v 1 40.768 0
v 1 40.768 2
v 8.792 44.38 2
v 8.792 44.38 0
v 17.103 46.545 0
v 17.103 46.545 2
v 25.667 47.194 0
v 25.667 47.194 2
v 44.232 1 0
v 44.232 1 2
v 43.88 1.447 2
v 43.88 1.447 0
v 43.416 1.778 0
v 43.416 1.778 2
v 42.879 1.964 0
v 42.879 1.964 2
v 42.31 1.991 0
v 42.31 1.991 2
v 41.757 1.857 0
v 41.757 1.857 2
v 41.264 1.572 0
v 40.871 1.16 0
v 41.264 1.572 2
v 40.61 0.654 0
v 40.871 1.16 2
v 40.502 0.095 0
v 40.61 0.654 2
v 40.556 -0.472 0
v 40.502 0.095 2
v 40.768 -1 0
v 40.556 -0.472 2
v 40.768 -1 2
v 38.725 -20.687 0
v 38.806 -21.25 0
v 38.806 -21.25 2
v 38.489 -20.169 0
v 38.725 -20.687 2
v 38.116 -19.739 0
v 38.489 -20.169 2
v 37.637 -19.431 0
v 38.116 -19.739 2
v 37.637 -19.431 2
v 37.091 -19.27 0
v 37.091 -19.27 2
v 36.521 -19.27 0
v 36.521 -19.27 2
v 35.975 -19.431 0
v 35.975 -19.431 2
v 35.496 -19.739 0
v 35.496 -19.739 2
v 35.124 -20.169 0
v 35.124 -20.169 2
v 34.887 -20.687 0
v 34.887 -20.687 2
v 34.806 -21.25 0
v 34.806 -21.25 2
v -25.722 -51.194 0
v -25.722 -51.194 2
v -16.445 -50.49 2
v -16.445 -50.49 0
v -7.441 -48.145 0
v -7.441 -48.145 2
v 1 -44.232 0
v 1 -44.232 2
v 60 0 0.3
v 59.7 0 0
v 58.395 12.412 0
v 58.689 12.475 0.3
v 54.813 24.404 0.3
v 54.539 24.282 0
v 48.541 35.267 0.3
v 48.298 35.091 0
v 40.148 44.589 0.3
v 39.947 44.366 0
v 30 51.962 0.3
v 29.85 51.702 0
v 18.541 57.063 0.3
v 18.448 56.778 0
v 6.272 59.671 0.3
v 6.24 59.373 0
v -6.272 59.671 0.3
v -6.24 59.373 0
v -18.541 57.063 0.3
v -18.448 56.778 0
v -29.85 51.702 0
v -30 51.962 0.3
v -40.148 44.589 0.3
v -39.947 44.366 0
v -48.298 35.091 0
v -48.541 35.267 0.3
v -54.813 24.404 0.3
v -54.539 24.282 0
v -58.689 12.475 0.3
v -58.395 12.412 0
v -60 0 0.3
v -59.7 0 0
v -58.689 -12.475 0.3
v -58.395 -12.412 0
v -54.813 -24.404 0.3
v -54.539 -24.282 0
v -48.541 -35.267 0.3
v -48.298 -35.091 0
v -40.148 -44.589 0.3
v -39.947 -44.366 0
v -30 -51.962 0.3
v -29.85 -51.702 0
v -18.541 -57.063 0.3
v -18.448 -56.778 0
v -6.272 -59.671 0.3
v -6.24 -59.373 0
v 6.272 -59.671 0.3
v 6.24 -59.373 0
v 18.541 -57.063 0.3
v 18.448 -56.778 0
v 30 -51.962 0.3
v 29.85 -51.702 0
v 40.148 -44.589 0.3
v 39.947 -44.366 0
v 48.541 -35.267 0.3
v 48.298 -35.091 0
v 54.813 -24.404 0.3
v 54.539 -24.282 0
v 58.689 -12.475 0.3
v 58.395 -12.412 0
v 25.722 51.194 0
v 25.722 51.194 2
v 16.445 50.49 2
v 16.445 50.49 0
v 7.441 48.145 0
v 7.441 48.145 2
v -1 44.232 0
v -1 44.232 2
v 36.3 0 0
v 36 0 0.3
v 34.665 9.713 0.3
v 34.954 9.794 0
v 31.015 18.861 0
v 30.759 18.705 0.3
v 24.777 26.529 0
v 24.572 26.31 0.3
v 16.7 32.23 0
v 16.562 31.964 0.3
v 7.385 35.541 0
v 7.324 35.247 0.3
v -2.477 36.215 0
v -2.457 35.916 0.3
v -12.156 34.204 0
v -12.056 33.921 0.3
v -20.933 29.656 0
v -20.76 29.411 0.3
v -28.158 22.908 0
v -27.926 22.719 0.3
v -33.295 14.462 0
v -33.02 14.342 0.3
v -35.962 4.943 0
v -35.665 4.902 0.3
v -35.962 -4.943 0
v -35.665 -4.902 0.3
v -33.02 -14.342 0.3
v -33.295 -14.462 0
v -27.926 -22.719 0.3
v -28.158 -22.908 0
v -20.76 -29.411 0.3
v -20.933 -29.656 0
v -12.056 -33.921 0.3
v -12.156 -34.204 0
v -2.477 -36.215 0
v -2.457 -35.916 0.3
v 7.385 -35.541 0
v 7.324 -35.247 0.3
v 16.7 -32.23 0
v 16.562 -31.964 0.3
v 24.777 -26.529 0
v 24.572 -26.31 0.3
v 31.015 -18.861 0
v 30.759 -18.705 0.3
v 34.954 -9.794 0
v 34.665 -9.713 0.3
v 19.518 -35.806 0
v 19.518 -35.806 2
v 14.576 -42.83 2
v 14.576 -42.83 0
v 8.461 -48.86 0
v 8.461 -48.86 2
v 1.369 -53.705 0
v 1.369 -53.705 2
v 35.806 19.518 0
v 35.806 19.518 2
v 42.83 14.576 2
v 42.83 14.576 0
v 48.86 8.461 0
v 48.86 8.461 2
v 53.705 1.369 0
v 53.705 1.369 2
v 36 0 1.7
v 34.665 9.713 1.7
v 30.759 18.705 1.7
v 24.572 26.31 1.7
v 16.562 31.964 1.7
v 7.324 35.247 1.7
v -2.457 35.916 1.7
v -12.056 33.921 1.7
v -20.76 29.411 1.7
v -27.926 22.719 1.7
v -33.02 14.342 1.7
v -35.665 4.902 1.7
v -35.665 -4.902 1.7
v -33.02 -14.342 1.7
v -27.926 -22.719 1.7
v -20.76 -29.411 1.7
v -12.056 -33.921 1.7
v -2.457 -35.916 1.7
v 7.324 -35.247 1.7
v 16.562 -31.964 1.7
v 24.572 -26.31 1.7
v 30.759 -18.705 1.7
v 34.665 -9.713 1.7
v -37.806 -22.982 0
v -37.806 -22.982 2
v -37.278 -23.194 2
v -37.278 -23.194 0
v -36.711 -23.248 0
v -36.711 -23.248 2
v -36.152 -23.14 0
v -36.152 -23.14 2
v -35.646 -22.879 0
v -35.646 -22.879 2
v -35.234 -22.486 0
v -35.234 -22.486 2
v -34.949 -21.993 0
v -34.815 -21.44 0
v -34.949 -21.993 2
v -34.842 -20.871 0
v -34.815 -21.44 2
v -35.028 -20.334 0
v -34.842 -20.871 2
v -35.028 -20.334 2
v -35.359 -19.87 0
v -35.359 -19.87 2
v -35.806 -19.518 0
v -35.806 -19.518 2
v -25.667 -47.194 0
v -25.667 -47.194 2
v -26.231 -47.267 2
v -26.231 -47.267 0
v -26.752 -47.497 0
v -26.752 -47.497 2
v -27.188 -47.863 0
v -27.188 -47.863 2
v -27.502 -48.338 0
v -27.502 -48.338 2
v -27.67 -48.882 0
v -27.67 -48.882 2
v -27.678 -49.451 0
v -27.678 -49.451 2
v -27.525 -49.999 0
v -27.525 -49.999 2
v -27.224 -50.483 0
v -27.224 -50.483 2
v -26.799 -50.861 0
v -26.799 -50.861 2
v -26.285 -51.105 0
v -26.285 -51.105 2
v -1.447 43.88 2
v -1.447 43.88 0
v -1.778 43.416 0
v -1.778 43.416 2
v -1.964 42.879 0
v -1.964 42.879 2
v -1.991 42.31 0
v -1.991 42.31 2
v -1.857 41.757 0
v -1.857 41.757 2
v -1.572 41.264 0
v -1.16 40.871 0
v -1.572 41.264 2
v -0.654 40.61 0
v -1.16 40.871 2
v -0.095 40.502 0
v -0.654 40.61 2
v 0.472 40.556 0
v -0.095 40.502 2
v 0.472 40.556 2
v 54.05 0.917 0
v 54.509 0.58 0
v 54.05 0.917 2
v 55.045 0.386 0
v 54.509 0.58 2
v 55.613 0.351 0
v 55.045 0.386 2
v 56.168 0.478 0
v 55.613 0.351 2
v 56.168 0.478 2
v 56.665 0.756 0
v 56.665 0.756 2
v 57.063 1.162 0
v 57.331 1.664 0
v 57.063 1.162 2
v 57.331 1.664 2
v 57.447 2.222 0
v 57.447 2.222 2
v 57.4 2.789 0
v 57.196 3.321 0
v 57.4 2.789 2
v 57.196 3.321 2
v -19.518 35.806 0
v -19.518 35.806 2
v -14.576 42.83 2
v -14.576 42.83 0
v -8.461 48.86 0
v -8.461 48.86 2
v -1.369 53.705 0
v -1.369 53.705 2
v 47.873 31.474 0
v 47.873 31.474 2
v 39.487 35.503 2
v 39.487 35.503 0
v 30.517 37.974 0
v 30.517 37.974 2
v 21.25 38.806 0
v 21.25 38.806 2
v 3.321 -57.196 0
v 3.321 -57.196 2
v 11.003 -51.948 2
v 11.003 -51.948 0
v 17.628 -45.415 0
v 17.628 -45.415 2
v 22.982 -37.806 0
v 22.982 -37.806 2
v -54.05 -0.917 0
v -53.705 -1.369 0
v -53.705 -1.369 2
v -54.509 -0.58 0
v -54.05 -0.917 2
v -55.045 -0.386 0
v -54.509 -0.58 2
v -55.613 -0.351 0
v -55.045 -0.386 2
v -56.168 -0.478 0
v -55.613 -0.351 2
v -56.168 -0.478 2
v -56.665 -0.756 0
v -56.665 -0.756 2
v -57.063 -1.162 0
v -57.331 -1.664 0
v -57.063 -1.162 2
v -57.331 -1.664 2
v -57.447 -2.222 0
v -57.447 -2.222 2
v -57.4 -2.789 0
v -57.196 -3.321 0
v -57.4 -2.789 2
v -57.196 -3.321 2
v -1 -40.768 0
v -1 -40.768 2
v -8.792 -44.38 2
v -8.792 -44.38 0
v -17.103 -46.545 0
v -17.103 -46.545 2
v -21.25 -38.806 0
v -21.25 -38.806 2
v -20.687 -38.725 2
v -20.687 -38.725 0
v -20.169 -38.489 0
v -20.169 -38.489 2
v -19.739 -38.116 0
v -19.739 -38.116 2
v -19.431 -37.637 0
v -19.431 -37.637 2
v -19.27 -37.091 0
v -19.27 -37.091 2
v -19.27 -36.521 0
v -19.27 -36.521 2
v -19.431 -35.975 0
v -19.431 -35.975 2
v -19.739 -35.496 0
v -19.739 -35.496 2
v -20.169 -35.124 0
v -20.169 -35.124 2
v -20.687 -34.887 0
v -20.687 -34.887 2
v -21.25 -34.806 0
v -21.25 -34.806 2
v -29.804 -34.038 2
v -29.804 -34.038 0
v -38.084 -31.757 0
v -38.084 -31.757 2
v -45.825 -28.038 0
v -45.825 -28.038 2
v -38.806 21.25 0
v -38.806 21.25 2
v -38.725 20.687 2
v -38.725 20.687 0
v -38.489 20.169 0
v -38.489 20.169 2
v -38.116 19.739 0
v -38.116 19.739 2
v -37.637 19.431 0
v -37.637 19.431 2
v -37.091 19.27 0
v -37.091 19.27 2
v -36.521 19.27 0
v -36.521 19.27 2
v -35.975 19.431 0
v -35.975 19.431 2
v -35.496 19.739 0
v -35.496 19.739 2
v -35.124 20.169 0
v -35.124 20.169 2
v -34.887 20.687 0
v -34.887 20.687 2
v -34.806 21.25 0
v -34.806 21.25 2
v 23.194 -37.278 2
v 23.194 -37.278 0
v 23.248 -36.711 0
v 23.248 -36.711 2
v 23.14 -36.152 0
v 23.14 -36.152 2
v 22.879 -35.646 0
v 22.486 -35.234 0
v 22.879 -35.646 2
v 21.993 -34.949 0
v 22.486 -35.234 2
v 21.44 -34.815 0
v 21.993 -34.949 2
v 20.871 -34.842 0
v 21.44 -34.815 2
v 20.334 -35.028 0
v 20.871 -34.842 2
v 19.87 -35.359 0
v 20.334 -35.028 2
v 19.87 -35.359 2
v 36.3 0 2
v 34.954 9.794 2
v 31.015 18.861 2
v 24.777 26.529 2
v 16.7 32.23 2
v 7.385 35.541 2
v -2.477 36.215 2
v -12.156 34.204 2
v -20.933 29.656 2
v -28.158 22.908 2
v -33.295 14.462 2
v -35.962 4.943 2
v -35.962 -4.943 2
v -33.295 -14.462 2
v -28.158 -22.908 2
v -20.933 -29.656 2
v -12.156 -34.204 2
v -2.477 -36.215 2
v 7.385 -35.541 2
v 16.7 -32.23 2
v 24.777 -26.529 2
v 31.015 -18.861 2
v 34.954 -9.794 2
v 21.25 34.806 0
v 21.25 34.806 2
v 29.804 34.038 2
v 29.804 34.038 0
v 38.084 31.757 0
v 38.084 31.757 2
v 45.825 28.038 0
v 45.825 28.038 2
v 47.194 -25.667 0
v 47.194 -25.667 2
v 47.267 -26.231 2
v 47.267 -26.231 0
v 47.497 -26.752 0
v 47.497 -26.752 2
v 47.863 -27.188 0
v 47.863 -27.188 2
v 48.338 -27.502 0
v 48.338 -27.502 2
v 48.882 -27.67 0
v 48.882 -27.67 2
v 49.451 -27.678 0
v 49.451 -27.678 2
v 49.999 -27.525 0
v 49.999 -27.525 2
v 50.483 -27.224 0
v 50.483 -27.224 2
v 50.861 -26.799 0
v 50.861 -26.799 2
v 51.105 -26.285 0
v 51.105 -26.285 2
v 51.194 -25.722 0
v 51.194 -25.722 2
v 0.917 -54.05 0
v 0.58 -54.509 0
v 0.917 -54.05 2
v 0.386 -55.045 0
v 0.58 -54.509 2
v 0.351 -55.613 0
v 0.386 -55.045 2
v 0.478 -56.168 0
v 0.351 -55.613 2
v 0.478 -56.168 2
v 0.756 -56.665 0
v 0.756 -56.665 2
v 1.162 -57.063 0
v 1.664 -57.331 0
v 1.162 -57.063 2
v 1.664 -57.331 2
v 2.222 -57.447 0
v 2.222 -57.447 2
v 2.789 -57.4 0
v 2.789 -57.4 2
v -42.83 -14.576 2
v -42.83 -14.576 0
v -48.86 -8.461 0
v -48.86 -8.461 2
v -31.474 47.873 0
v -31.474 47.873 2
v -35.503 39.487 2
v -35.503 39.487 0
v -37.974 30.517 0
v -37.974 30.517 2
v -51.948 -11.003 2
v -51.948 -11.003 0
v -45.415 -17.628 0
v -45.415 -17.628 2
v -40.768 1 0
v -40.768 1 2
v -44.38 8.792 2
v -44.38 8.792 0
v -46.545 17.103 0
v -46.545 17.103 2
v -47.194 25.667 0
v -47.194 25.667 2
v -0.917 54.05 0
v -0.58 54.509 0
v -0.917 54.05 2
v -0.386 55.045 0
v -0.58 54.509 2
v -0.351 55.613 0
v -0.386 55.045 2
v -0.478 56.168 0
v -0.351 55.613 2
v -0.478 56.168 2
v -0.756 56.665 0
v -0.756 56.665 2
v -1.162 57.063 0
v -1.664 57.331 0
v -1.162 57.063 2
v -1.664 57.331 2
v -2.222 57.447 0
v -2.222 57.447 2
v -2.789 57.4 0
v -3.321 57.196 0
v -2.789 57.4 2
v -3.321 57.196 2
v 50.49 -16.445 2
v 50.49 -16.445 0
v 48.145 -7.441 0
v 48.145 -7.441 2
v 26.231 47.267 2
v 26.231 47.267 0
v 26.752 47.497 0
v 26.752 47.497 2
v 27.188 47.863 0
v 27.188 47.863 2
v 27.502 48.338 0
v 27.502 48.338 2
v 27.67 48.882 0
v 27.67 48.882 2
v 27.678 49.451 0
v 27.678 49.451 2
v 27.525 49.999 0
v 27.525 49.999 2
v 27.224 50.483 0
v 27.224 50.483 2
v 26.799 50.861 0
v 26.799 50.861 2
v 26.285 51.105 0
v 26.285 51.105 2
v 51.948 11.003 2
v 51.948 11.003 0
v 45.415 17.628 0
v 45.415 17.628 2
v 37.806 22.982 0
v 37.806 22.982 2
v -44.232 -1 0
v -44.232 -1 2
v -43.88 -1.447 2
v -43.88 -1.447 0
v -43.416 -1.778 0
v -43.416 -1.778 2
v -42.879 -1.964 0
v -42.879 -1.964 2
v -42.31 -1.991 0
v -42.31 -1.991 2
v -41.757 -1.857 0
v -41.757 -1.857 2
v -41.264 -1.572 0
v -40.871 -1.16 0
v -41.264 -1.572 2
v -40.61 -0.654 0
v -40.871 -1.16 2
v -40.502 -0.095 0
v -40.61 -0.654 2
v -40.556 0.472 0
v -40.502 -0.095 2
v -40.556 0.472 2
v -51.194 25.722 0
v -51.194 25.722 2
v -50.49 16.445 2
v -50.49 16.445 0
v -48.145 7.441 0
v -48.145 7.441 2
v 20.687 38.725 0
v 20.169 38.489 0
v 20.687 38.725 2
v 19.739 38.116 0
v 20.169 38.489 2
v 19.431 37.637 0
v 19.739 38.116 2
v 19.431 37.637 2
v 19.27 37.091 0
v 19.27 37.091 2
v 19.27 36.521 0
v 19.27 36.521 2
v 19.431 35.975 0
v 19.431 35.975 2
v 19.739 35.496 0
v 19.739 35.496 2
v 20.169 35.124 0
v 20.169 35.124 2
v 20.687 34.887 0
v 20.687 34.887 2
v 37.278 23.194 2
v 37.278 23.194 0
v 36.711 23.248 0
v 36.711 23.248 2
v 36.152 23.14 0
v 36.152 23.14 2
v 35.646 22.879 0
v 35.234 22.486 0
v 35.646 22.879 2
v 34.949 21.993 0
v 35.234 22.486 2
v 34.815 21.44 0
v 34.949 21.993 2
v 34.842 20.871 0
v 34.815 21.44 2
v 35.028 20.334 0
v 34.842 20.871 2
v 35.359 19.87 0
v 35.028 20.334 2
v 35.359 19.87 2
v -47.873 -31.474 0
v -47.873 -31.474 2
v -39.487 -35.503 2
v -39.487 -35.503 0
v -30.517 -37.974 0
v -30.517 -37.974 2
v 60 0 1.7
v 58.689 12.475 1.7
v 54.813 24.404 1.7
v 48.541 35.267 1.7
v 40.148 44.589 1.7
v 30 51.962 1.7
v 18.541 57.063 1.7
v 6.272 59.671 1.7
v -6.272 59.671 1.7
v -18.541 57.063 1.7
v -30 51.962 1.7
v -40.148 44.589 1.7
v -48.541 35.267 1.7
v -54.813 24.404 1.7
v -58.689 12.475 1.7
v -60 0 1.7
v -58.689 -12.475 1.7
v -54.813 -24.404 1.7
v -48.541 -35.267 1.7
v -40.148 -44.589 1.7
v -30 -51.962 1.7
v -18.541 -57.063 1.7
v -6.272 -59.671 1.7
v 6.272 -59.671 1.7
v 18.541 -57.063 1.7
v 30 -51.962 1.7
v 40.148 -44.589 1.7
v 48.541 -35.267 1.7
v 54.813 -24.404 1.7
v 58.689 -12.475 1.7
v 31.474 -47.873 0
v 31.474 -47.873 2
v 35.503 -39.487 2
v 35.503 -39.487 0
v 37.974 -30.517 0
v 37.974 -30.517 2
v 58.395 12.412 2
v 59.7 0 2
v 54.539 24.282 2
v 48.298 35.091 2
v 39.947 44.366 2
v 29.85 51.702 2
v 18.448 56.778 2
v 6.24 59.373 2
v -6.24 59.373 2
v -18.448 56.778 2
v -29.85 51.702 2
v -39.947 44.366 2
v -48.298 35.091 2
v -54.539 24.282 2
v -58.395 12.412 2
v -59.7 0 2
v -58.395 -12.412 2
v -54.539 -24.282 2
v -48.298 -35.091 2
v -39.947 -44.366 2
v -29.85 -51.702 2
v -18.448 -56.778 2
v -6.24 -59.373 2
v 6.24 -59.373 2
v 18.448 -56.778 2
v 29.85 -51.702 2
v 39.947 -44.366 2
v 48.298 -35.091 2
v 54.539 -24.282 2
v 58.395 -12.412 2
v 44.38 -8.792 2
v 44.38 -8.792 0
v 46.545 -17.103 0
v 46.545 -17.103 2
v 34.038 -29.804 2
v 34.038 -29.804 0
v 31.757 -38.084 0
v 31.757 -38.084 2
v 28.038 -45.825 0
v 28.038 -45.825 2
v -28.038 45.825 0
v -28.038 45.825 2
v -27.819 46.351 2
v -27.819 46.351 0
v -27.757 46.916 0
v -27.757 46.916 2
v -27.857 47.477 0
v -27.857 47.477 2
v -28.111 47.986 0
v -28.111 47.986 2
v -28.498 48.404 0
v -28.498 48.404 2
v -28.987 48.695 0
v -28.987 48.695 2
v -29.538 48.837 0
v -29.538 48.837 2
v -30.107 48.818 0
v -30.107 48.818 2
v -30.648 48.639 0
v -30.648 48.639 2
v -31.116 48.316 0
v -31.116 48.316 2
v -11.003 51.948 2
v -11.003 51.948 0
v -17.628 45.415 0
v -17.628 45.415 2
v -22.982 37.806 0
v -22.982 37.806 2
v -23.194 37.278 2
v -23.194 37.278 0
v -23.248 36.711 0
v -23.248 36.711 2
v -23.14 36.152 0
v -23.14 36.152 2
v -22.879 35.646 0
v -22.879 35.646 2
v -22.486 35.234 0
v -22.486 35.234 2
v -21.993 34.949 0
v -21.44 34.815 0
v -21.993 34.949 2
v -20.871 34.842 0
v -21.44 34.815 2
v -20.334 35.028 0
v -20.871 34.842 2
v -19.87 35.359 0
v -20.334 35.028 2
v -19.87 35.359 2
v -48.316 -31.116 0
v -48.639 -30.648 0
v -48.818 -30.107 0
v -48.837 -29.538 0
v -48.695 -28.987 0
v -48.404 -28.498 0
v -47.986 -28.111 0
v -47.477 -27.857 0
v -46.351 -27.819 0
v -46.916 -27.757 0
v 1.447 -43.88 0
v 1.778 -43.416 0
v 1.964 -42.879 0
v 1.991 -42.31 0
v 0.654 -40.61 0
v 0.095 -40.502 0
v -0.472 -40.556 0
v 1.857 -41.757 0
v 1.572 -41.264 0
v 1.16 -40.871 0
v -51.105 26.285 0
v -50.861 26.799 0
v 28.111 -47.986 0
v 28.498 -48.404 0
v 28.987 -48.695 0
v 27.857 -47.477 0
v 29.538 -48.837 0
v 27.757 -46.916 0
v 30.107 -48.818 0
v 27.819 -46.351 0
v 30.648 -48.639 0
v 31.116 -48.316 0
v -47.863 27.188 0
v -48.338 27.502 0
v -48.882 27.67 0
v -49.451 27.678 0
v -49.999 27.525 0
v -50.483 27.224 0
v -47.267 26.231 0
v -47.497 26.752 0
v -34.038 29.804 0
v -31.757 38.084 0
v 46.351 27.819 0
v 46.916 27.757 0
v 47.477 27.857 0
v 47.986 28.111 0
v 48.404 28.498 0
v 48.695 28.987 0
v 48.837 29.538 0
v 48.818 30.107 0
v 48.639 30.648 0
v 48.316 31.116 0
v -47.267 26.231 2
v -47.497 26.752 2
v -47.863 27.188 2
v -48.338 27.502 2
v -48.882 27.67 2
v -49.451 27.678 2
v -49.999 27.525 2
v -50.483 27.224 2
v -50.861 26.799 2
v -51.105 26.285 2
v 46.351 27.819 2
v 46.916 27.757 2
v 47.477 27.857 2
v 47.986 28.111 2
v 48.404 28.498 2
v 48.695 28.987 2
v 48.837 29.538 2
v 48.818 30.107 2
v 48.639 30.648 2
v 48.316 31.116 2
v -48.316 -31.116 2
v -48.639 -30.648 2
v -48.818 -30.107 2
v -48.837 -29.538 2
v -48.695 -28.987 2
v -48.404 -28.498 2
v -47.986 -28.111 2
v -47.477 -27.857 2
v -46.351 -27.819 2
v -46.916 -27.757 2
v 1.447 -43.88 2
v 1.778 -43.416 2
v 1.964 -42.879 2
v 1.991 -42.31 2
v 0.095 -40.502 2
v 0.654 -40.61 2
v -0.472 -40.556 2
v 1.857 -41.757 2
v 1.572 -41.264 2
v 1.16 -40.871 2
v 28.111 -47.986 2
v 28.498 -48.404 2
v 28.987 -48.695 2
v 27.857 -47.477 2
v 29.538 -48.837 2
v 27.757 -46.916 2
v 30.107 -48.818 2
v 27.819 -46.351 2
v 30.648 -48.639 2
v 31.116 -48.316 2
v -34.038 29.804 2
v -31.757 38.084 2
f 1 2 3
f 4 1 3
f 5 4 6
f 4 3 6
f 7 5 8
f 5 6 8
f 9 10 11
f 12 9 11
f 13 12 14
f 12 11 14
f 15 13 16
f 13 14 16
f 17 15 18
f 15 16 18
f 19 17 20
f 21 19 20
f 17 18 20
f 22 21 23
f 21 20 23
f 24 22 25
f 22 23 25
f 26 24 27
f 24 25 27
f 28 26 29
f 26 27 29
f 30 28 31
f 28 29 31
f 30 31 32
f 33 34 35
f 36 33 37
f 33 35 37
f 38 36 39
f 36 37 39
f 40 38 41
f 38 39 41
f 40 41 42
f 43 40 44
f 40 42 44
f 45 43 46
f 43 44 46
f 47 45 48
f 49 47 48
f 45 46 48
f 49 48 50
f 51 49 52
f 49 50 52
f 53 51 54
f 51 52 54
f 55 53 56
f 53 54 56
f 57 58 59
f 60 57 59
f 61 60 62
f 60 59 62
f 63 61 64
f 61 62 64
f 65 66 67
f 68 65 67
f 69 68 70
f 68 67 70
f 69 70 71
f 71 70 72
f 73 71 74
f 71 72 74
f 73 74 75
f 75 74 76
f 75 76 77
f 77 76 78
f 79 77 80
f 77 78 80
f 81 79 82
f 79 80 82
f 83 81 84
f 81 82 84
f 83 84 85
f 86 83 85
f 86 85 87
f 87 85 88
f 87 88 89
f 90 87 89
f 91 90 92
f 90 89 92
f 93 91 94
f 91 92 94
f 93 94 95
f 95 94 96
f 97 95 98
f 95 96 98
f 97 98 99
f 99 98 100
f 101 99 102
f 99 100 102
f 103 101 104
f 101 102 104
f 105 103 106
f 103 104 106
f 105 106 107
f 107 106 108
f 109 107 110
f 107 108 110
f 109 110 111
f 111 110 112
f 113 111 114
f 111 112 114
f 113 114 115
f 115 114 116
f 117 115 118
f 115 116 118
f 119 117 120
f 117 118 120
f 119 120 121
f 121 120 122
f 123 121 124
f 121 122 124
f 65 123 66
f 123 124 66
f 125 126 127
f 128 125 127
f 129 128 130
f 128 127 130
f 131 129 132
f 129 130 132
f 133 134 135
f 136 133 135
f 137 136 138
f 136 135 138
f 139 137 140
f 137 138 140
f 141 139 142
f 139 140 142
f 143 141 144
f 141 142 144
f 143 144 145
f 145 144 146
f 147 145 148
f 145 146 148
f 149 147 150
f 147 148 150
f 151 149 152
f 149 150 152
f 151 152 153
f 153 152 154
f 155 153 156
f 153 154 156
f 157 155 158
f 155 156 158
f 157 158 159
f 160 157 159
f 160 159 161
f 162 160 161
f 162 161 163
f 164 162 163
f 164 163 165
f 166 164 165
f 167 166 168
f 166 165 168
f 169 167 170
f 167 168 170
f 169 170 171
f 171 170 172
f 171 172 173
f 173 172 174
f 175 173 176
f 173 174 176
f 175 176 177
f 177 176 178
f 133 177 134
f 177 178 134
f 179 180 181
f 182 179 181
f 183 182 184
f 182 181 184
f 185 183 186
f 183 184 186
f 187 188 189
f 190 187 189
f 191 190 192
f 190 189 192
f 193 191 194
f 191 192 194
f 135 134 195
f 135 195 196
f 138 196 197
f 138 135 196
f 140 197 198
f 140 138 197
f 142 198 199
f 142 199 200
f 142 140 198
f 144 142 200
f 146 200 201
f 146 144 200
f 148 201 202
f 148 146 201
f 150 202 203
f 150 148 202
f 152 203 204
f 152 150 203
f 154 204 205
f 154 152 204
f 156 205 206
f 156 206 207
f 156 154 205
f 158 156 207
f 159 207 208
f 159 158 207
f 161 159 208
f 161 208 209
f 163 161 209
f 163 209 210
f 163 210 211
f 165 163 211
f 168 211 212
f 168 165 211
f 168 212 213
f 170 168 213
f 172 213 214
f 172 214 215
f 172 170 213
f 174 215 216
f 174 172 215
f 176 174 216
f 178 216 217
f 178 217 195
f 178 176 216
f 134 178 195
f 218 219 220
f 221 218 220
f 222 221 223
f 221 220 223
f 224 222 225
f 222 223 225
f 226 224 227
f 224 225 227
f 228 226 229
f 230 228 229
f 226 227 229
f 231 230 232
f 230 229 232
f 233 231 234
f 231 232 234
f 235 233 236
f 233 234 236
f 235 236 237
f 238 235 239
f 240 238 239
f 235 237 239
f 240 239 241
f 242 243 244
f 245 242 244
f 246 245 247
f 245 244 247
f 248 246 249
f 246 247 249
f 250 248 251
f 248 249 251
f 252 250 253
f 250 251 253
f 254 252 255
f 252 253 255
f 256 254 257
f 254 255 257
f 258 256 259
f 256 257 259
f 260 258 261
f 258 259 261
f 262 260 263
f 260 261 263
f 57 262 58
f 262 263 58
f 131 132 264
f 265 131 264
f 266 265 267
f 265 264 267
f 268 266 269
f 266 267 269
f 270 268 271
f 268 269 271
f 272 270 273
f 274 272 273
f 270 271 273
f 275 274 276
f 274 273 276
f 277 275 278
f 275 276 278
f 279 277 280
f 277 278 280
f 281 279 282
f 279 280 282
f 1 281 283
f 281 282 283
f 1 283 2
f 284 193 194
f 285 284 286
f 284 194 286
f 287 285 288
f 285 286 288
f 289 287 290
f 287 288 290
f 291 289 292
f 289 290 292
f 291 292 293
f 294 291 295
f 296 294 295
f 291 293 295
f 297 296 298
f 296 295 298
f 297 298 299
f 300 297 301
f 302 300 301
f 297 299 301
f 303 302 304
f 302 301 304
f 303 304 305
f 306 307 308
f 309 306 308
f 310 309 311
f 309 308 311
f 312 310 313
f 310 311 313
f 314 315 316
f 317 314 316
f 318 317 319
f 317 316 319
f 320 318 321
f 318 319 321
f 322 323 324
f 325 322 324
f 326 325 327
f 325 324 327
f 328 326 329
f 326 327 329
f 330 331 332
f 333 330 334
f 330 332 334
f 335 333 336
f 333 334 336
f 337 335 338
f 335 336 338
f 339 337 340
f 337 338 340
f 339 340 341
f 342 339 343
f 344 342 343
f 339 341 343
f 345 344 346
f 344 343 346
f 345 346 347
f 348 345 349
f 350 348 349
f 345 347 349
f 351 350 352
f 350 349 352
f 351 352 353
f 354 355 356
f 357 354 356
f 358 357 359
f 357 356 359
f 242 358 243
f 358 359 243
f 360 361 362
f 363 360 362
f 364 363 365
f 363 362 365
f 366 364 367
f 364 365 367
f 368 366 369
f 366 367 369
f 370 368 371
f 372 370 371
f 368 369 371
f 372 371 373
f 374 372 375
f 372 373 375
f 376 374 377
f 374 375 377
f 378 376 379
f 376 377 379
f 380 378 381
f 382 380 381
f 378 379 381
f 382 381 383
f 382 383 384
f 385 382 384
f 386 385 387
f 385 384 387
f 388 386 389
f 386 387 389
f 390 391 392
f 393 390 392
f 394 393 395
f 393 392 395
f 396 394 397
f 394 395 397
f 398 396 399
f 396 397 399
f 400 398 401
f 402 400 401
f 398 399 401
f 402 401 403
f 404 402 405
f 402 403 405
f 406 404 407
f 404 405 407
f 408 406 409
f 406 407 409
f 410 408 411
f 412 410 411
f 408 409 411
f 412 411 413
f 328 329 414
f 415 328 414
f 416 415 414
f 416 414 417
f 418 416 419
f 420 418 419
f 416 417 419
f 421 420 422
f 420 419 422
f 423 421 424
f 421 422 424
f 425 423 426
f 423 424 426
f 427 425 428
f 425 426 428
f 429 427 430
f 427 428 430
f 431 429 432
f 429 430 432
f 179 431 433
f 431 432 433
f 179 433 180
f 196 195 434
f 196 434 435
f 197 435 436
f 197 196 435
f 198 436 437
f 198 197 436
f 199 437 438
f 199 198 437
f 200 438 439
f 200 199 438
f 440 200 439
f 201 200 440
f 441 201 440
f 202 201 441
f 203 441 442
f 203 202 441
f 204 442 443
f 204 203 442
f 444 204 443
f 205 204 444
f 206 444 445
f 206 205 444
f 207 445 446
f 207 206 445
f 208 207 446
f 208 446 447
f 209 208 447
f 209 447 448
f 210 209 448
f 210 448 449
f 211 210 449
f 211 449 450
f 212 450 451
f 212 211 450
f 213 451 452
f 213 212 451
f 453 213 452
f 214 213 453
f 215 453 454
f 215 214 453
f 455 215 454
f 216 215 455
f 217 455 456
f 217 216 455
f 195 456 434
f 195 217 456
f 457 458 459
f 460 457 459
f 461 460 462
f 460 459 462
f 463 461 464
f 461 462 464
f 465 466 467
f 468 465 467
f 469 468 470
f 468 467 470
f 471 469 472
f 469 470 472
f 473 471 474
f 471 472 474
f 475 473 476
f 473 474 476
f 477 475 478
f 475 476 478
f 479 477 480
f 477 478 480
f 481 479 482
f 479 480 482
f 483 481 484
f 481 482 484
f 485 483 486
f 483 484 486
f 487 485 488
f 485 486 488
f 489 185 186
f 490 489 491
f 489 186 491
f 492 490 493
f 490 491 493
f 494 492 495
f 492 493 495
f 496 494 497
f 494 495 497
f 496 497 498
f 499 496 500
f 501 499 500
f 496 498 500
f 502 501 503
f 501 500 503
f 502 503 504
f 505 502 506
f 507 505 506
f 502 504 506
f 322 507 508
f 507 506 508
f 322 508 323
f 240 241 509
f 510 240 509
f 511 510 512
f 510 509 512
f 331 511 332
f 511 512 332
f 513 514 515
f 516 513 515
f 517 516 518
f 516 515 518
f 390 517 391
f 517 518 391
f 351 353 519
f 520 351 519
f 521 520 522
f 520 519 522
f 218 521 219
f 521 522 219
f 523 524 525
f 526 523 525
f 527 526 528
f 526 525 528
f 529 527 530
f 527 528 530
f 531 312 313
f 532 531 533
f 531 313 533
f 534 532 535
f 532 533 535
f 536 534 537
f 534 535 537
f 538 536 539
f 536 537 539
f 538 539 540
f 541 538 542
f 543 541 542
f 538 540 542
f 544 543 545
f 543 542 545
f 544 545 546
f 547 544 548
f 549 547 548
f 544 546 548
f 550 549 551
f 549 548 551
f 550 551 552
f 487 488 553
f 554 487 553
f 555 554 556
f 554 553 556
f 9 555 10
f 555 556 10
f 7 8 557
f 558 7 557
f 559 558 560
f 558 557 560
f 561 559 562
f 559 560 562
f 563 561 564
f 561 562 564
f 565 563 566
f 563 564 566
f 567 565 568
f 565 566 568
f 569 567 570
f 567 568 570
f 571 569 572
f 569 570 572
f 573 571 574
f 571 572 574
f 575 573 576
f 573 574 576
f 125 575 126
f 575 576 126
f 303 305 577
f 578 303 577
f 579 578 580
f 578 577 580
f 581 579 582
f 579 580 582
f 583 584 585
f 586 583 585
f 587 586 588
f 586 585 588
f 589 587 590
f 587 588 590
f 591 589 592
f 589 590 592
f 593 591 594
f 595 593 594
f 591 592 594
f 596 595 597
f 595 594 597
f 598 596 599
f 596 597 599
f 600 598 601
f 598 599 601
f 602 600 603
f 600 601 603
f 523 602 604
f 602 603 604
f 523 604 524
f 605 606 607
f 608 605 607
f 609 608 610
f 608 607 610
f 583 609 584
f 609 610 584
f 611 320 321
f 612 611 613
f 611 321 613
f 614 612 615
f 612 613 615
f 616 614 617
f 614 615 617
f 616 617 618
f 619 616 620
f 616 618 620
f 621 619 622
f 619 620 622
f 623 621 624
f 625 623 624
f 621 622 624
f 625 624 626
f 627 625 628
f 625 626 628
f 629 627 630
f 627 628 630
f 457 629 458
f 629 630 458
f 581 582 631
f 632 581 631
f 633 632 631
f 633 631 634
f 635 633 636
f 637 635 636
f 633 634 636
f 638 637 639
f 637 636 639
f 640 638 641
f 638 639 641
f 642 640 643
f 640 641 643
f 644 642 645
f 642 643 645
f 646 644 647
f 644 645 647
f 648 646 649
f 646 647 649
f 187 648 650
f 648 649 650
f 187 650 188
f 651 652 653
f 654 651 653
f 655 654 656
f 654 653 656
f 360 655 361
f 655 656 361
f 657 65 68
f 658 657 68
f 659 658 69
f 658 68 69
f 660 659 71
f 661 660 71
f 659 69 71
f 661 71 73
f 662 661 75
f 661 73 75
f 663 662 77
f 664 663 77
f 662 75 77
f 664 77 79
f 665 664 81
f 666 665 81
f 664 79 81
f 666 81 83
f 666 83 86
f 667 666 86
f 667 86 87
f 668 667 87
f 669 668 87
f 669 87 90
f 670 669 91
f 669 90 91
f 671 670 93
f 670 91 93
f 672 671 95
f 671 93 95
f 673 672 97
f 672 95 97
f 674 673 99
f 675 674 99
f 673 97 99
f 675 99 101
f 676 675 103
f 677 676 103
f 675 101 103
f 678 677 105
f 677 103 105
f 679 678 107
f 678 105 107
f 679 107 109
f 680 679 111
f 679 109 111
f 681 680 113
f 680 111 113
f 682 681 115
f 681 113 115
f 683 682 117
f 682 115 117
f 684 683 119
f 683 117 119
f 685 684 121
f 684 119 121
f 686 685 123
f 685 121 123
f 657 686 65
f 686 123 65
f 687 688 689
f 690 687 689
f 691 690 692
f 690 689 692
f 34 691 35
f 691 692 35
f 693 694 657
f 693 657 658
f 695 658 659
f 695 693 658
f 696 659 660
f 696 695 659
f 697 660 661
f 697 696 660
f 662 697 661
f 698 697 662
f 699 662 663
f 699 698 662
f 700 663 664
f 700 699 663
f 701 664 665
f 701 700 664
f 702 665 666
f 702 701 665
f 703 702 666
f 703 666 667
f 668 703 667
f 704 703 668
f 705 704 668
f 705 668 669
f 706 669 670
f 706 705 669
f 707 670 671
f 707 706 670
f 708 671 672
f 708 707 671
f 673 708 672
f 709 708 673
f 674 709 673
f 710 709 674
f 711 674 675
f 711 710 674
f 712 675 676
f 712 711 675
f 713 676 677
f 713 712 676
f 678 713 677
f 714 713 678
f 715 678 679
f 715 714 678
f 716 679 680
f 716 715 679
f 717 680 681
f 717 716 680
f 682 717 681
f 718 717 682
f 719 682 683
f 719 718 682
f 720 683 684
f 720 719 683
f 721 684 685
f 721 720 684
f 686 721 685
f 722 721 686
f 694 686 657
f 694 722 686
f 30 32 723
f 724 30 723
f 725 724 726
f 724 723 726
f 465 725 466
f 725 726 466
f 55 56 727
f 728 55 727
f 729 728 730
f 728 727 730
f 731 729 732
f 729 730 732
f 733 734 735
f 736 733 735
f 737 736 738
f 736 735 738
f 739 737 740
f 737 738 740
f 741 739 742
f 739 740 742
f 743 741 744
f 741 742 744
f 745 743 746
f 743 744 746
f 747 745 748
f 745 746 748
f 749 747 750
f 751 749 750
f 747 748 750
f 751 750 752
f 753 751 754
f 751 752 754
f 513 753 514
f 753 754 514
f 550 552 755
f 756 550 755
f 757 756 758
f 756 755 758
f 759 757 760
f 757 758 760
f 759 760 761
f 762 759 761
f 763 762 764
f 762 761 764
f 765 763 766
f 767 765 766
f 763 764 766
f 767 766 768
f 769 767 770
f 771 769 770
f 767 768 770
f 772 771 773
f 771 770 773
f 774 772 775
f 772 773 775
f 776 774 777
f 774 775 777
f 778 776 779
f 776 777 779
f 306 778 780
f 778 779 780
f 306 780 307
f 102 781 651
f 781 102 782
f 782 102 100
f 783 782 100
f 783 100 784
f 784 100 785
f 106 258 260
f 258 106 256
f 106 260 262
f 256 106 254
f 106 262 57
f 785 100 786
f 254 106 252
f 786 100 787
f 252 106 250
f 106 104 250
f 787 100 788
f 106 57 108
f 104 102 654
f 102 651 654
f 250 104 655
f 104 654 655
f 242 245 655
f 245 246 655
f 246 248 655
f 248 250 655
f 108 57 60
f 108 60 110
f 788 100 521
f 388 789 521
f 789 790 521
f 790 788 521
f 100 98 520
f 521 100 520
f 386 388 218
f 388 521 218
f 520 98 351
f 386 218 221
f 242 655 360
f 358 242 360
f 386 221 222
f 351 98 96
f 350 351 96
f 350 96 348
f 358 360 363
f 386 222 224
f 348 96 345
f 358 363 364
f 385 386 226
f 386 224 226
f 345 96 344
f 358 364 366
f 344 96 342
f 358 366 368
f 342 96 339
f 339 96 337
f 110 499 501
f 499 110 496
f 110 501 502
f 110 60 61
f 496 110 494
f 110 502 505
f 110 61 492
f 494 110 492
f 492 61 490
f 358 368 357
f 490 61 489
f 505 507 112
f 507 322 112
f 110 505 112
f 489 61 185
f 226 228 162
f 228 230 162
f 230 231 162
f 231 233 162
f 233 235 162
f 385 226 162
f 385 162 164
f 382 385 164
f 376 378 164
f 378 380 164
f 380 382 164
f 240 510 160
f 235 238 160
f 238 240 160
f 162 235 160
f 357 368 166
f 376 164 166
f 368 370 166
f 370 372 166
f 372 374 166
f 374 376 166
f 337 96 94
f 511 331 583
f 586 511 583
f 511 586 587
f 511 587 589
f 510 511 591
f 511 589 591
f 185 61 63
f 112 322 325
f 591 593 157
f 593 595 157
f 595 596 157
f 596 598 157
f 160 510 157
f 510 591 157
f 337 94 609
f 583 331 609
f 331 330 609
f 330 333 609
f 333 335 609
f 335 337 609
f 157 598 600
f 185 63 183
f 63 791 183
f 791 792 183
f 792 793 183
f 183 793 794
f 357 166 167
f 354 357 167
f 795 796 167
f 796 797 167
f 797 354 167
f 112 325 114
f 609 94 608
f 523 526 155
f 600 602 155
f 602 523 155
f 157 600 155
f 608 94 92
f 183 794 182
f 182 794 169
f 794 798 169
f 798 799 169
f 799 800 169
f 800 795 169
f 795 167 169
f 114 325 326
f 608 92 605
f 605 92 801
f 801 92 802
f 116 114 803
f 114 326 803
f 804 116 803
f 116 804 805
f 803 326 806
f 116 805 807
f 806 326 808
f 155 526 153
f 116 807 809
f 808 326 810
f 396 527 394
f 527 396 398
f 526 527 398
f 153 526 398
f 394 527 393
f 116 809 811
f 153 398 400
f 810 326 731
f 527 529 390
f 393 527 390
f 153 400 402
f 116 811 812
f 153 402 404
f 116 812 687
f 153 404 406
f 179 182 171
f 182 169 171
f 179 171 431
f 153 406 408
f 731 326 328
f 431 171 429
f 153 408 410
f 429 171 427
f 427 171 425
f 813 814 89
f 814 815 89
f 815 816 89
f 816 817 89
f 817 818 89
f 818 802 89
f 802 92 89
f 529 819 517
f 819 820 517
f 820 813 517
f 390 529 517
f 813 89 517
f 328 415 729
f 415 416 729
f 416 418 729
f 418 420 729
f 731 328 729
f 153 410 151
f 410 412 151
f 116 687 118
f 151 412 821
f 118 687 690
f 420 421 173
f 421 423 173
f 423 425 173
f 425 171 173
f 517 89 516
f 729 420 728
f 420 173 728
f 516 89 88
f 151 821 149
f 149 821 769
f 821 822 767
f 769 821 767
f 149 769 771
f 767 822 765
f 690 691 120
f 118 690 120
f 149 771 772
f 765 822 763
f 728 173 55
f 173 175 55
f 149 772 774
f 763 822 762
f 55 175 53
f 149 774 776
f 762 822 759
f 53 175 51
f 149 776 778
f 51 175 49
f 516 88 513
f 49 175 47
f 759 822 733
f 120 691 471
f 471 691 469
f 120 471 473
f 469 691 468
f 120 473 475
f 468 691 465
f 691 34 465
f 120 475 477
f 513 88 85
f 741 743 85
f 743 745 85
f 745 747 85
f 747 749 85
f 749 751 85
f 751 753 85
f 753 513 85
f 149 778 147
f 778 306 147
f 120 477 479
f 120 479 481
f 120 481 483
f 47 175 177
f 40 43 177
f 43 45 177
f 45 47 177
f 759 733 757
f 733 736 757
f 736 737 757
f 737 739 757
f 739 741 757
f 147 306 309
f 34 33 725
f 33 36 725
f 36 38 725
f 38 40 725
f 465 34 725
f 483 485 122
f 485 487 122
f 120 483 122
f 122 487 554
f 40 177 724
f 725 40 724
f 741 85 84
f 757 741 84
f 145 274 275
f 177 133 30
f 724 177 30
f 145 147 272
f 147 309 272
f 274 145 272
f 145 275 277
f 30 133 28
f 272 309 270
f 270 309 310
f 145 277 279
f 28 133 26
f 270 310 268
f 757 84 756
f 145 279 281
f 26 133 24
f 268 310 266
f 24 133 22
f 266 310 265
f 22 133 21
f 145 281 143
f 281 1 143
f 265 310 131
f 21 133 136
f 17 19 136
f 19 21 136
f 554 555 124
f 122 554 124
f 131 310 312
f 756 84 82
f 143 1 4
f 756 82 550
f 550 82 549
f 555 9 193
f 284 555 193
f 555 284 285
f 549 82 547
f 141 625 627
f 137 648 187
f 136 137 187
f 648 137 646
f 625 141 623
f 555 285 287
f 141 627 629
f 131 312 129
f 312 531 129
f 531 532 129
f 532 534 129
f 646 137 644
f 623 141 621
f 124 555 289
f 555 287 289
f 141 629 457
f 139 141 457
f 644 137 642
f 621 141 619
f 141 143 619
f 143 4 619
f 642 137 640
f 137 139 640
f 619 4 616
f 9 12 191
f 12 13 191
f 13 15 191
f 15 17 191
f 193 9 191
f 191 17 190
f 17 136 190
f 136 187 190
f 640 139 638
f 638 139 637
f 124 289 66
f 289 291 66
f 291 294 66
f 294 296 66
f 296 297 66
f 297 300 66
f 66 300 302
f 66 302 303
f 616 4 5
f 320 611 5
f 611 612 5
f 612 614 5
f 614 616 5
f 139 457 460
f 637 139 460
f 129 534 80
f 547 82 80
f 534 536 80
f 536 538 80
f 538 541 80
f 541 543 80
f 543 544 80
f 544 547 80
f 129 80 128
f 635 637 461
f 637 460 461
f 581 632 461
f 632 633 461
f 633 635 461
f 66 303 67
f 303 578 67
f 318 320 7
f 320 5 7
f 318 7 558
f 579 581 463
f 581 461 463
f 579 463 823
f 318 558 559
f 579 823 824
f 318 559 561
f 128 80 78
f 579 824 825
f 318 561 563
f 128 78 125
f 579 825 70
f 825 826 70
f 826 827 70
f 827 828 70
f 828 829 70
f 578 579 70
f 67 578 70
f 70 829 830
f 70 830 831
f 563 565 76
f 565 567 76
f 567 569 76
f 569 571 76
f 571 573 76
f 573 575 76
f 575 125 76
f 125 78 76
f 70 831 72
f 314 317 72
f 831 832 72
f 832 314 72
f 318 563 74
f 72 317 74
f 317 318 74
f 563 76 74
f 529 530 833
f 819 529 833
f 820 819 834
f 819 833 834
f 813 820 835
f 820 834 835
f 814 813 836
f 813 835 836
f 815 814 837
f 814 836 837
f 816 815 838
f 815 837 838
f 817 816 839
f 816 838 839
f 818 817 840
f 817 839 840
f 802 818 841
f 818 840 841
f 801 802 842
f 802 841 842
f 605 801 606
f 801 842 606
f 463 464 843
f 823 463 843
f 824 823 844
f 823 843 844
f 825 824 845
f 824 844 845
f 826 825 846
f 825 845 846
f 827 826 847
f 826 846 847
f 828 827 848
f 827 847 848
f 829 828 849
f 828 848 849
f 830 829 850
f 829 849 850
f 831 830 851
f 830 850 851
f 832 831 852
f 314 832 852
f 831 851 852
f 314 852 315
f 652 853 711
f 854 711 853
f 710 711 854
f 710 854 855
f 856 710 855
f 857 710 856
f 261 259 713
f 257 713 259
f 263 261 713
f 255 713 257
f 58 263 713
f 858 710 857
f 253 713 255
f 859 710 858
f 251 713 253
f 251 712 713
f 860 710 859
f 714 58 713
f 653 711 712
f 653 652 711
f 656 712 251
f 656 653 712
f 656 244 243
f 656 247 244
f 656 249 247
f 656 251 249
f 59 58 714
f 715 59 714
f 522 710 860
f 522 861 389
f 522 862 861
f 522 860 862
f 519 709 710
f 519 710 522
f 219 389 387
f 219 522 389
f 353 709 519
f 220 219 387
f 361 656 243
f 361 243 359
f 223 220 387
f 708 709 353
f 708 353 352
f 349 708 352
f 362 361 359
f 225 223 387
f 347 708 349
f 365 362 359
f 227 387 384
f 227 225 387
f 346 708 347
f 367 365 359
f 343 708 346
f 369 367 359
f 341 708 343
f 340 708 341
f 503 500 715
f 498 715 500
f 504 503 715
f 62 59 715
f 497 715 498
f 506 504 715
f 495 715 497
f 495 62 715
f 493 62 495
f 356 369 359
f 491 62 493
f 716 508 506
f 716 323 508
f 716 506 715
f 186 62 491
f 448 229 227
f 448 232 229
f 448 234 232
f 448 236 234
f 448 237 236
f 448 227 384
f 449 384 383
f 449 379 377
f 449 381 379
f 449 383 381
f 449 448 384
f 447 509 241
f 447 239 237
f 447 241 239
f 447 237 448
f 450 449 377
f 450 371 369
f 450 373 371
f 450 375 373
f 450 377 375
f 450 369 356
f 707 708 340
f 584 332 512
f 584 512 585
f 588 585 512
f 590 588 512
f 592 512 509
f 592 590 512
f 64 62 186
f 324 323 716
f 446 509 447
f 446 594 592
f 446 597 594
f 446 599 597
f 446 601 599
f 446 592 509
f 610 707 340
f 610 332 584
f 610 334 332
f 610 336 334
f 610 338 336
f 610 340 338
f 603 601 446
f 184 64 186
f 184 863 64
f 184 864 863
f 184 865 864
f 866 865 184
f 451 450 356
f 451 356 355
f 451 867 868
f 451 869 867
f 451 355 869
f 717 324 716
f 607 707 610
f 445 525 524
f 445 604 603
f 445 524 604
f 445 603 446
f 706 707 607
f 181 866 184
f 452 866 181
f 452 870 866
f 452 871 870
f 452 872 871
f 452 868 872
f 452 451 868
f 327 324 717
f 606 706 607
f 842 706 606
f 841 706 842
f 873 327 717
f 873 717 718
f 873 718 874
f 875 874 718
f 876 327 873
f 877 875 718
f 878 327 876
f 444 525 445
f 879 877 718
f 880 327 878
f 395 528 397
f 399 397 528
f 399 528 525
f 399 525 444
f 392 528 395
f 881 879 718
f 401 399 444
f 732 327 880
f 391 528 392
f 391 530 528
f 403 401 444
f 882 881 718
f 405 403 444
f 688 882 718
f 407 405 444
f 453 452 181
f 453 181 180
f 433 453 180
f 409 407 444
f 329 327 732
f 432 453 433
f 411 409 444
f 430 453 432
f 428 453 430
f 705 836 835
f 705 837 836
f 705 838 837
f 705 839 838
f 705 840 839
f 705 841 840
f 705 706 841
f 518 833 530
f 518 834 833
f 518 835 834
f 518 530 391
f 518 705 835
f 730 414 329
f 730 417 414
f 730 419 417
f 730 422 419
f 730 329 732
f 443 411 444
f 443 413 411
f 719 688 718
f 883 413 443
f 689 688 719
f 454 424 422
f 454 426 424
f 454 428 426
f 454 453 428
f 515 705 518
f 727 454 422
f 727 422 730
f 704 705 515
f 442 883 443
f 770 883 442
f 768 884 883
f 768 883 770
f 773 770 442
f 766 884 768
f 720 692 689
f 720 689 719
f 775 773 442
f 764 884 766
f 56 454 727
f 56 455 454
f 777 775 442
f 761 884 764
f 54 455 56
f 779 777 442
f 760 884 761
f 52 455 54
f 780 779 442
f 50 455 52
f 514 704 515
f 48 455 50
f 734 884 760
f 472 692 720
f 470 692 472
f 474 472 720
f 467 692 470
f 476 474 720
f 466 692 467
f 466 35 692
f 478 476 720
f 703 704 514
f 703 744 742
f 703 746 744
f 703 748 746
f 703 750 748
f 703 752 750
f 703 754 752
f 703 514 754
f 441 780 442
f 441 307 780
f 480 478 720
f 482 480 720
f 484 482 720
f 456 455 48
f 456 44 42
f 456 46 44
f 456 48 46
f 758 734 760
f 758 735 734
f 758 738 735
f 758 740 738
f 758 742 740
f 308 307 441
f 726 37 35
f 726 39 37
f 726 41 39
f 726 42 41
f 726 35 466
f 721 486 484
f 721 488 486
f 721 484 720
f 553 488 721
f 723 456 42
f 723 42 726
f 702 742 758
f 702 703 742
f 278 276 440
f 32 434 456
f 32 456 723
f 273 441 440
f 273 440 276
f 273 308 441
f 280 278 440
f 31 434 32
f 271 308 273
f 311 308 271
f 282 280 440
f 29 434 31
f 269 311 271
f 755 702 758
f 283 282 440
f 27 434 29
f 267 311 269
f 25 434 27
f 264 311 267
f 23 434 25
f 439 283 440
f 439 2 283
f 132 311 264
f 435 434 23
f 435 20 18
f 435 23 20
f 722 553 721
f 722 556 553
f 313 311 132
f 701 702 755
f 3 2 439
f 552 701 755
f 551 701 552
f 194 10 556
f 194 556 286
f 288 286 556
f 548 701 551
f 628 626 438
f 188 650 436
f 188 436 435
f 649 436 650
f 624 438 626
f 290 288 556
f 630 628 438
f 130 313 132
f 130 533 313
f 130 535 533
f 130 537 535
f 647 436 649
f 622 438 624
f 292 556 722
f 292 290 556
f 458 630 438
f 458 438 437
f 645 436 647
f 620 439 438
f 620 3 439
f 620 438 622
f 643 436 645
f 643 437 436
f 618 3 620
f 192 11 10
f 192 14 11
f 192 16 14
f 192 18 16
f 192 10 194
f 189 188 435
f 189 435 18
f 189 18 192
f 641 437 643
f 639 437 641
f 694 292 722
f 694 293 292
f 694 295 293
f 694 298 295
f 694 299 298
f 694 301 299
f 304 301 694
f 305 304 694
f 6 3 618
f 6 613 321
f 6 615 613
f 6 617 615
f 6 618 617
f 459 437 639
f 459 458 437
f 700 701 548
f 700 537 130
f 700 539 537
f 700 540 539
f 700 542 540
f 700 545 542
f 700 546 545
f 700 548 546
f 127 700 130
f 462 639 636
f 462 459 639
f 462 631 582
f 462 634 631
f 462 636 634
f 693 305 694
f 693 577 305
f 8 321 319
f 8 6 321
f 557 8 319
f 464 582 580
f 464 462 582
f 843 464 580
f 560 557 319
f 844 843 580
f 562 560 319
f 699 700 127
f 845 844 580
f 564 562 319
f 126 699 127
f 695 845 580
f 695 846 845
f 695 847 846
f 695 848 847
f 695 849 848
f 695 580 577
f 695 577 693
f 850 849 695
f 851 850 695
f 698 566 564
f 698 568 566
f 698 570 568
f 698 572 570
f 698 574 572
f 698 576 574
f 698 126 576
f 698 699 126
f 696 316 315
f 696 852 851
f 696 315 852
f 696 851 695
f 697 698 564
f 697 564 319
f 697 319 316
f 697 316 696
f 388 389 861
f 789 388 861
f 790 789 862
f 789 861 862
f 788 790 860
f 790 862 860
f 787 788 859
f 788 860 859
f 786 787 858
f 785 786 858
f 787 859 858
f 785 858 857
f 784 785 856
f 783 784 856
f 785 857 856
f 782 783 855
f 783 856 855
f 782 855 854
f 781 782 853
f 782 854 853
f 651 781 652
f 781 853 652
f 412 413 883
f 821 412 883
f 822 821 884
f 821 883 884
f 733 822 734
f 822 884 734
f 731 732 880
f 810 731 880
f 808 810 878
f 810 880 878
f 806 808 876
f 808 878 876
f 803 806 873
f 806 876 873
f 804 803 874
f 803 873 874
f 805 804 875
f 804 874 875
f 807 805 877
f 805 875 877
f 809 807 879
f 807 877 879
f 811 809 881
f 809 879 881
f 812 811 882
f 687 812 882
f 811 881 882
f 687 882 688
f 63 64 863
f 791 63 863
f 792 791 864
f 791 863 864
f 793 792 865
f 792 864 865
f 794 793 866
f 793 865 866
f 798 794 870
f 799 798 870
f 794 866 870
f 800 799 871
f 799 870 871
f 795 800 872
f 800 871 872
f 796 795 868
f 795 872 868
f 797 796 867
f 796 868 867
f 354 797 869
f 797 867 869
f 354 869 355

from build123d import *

# Parameters (mm, degrees)
SKETCH1_R           = 60
SKETCH1_R_2         = 36
BOSS_EXTRUDE1_DEPTH = 2
CUT_EXTRUDE1_DEPTH  = 85.876380696
CIRPATTERN1_COUNT   = 12
CHAMFER1_SIZE       = 0.3


with BuildPart() as part:
    # Sketch1 → Boss-Extrude1 (new body)
    with BuildSketch(Plane.XY):
        Circle(SKETCH1_R)
        Circle(SKETCH1_R_2, mode=Mode.SUBTRACT)
    extrude(amount=BOSS_EXTRUDE1_DEPTH)

    # Sketch2 → Cut-Extrude1 (cut, through all)
    with BuildSketch(Plane.XY.offset(2)):
        with BuildLine():
            ThreePointArc((25.722326885, 51.193712683), (11.890599802, 49.519139452), (-1, 44.232050808))
            ThreePointArc((-1, 44.232050808), (-1.732050808, 41.5), (1, 40.767949192))
            ThreePointArc((1, 40.767949192), (12.899015202, 45.64833871), (25.666763279, 47.194098616))
            ThreePointArc((25.666763279, 47.194098616), (27.694352115, 49.166123846), (25.722326885, 51.193712683))
        make_face()
    cut_extrude1 = extrude(amount=-CUT_EXTRUDE1_DEPTH, mode=Mode.SUBTRACT)

    # CirPattern1: Cut-Extrude1 ×12 about axis
    cirpattern1_axis = Axis((0, 0, 0), (0, 0, 1))
    for i in range(1, CIRPATTERN1_COUNT):
        add(cut_extrude1.rotate(cirpattern1_axis, i * 360 / CIRPATTERN1_COUNT), mode=Mode.SUBTRACT)

    # Chamfer1
    chamfer1_edges = [part.edges().sort_by_distance(p)[0] for p in [
        (-60, 0, 0),
        (-60, 0, 2),
        (-36, 0, 0),
        (-36, 0, 2),
    ]]
    chamfer(chamfer1_edges, length=CHAMFER1_SIZE)


solid = part.part
